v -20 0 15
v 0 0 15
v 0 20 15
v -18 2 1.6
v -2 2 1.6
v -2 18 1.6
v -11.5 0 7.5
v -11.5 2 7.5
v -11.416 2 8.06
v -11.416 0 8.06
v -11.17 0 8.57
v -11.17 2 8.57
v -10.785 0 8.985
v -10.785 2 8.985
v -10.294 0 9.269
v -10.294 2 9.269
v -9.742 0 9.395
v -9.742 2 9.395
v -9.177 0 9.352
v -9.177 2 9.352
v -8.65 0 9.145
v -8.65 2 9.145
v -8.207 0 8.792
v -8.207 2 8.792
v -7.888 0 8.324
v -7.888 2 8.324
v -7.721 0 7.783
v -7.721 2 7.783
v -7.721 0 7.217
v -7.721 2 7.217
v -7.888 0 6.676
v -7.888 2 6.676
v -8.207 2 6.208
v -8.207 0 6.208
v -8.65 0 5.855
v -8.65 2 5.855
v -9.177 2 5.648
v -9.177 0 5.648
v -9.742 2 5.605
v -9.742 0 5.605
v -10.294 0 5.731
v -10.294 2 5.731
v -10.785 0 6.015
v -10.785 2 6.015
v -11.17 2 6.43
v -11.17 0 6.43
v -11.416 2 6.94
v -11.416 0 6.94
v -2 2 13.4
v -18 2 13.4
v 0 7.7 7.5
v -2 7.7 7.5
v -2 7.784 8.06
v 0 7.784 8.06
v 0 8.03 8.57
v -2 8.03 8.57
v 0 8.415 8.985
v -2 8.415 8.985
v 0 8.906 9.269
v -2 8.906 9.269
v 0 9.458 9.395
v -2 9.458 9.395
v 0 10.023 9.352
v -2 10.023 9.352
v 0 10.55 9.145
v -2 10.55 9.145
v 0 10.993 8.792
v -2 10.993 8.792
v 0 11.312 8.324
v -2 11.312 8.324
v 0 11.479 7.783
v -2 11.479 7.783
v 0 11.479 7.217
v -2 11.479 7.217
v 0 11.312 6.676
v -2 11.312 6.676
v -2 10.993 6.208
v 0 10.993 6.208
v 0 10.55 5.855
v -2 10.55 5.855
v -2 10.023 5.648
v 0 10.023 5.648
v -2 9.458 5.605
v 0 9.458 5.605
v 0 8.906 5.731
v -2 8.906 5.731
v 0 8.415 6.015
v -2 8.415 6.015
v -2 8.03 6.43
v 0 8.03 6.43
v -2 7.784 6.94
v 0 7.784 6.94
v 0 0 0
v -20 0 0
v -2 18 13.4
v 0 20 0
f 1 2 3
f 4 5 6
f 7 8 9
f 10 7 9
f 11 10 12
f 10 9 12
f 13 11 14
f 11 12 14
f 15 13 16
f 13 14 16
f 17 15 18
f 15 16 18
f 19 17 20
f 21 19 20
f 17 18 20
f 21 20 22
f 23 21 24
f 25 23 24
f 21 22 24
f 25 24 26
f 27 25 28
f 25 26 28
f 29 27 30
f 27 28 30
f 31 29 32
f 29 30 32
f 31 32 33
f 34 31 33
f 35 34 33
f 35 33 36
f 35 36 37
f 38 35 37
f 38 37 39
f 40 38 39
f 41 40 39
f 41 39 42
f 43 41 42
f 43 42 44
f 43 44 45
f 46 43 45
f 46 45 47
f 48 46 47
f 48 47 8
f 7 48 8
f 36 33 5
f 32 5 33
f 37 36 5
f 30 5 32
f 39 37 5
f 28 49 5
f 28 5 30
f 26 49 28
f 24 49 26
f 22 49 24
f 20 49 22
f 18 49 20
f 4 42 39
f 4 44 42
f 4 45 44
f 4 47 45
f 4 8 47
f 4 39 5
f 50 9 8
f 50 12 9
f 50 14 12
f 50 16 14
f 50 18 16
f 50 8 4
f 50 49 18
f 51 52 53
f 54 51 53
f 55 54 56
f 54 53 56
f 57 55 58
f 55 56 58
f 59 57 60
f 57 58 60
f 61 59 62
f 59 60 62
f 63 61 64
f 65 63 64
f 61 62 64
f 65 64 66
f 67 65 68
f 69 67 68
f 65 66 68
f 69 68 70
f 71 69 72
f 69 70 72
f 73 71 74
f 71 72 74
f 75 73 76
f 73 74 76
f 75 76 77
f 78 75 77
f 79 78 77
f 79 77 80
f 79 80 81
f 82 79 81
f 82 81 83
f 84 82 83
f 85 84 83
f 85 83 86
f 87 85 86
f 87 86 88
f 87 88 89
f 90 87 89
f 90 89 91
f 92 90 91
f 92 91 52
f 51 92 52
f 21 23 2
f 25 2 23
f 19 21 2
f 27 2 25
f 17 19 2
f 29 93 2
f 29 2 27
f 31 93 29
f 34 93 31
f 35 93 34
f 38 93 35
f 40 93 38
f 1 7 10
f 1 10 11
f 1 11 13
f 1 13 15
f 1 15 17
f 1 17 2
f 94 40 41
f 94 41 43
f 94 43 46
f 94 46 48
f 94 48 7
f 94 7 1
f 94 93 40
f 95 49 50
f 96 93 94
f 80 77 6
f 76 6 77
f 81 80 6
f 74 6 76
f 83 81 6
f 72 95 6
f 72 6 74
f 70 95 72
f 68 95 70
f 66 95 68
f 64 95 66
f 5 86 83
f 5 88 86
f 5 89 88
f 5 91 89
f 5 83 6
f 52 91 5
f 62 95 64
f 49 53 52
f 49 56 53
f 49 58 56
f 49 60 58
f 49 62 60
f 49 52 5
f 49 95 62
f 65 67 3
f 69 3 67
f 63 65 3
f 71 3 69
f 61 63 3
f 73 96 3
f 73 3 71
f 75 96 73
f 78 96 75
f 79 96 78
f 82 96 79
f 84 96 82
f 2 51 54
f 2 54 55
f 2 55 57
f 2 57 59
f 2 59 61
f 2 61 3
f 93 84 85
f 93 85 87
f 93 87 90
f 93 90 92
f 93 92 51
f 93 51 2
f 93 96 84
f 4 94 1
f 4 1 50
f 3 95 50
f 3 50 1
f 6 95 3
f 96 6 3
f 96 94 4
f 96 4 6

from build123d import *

# Parameters (mm, degrees)
BOSS_EXTRUDE1_DEPTH = 15
CUT_EXTRUDE1_START  = -1.6
CUT_EXTRUDE1_DEPTH  = 11.8
SKETCH3_R           = 1.9
CUT_EXTRUDE2_DEPTH  = 31.805843601
SKETCH4_R           = 1.9
CUT_EXTRUDE3_DEPTH  = 31.805843601


with BuildPart() as part:
    # Sketch1 → Boss-Extrude1 (new body)
    with BuildSketch(Plane.XY):
        Polygon((0, 0), (-20, 0), (0, 20), align=None)
    extrude(amount=BOSS_EXTRUDE1_DEPTH)

    # Sketch2 → Cut-Extrude1 (cut)
    with BuildSketch(Plane.XY.offset(15).offset(CUT_EXTRUDE1_START)):
        Polygon((-18, 2), (-2, 18), (-2, 2), align=None)
    extrude(amount=-CUT_EXTRUDE1_DEPTH, mode=Mode.SUBTRACT)

    # Sketch3 → Cut-Extrude2 (cut, through all)
    with BuildSketch(Plane.ZY.offset(2)):
        with Locations(Location((7.5, 9.6, 0), (0, 0, 270))):
            Circle(SKETCH3_R)
    extrude(amount=-CUT_EXTRUDE2_DEPTH, mode=Mode.SUBTRACT)

    # Sketch4 → Cut-Extrude3 (cut, through all)
    with BuildSketch(Plane(origin=(0, 2, 0), x_dir=(1, 0, 0), z_dir=(0, 1, 0))):
        with Locations(Location((-9.6, -7.5, 0), (0, 0, 180))):
            Circle(SKETCH4_R)
    extrude(amount=-CUT_EXTRUDE3_DEPTH, mode=Mode.SUBTRACT)


solid = part.part
